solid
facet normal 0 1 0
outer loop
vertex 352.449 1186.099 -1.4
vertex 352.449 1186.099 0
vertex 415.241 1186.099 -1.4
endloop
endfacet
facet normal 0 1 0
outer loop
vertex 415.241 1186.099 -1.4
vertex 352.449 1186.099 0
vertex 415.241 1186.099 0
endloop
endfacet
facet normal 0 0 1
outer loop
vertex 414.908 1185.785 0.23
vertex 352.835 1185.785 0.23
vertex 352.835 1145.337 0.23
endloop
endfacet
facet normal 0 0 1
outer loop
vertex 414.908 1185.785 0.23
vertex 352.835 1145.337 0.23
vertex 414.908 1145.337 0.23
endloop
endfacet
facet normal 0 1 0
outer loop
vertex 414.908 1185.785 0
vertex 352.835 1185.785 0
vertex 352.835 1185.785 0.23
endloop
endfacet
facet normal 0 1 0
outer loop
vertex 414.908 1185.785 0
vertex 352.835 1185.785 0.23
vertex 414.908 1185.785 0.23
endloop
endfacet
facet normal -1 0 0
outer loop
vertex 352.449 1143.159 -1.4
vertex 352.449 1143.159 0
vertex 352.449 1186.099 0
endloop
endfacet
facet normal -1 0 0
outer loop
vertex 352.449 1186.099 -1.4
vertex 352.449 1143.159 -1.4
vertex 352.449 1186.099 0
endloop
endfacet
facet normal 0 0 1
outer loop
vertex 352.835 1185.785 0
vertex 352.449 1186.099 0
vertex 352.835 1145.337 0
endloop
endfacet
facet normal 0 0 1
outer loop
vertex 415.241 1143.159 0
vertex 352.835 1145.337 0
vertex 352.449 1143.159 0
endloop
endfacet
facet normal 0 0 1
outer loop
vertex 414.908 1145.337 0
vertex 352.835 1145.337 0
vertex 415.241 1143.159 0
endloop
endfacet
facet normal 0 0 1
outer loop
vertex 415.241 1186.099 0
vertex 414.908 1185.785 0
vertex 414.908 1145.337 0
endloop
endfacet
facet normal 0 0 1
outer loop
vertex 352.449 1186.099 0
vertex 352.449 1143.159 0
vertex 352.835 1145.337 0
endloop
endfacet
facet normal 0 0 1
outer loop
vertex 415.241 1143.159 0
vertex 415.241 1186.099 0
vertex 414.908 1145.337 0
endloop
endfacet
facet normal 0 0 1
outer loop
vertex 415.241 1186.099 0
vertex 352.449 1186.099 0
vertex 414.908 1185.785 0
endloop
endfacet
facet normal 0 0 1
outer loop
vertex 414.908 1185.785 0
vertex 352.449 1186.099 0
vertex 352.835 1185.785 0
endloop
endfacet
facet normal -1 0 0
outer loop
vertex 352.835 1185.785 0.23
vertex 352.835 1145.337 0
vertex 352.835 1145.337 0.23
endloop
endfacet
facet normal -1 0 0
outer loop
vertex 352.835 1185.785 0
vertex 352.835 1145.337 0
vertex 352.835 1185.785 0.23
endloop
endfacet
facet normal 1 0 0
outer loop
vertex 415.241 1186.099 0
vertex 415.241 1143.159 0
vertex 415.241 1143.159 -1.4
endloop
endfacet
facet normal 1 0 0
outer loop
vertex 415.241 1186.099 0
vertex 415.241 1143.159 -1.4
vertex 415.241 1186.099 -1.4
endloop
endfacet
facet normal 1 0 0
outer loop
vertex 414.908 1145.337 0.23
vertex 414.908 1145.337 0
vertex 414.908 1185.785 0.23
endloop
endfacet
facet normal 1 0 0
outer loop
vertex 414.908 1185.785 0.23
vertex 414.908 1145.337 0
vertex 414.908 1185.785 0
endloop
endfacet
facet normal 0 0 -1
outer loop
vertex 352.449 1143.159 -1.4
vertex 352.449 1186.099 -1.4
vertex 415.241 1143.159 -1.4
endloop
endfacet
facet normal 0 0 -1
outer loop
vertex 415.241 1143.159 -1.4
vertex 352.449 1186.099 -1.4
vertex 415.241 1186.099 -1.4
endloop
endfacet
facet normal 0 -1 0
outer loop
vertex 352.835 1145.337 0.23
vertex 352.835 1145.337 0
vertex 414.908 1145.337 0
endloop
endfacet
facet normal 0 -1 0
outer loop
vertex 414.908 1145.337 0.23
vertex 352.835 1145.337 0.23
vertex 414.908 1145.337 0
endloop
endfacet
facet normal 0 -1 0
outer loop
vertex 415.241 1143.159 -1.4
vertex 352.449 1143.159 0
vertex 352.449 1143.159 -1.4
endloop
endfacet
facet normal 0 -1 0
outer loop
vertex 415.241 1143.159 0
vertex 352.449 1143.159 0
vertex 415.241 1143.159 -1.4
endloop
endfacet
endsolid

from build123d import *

# Parameters (mm, degrees)
CADREINTERNE_W     = 62.073460636
CADREINTERNE_H     = 40.448352725
BOSS_EXTRU_1_DEPTH = 0.23
CADRE2_W           = 62.792386967
CADRE2_H           = 41.279110161
BOSS_EXTRU_2_DEPTH = 0.6
CADREMAX_W         = 62.792386967
CADREMAX_H         = 42.940137113
BOSS_EXTRU_3_DEPTH = 1.4


with BuildPart() as part:
    # cadreinterne → Boss.-Extru.1 (new body)
    with BuildSketch(Plane.XY):
        with Locations((383.87151409, 1165.56084344)):
            Rectangle(CADREINTERNE_W, CADREINTERNE_H)
    extrude(amount=BOSS_EXTRU_1_DEPTH)

    # cadre2 → Boss.-Extru.2 (add)
    with BuildSketch(Plane.XY):
        with Locations((383.844701739, 1165.459766272)):
            Rectangle(CADRE2_W, CADRE2_H)
    extrude(amount=-BOSS_EXTRU_2_DEPTH)

    # cadremax → Boss.-Extru.3 (add)
    with BuildSketch(Plane.XY):
        with Locations((383.844701739, 1164.629252796)):
            Rectangle(CADREMAX_W, CADREMAX_H)
    extrude(amount=-BOSS_EXTRU_3_DEPTH)


solid = part.part
